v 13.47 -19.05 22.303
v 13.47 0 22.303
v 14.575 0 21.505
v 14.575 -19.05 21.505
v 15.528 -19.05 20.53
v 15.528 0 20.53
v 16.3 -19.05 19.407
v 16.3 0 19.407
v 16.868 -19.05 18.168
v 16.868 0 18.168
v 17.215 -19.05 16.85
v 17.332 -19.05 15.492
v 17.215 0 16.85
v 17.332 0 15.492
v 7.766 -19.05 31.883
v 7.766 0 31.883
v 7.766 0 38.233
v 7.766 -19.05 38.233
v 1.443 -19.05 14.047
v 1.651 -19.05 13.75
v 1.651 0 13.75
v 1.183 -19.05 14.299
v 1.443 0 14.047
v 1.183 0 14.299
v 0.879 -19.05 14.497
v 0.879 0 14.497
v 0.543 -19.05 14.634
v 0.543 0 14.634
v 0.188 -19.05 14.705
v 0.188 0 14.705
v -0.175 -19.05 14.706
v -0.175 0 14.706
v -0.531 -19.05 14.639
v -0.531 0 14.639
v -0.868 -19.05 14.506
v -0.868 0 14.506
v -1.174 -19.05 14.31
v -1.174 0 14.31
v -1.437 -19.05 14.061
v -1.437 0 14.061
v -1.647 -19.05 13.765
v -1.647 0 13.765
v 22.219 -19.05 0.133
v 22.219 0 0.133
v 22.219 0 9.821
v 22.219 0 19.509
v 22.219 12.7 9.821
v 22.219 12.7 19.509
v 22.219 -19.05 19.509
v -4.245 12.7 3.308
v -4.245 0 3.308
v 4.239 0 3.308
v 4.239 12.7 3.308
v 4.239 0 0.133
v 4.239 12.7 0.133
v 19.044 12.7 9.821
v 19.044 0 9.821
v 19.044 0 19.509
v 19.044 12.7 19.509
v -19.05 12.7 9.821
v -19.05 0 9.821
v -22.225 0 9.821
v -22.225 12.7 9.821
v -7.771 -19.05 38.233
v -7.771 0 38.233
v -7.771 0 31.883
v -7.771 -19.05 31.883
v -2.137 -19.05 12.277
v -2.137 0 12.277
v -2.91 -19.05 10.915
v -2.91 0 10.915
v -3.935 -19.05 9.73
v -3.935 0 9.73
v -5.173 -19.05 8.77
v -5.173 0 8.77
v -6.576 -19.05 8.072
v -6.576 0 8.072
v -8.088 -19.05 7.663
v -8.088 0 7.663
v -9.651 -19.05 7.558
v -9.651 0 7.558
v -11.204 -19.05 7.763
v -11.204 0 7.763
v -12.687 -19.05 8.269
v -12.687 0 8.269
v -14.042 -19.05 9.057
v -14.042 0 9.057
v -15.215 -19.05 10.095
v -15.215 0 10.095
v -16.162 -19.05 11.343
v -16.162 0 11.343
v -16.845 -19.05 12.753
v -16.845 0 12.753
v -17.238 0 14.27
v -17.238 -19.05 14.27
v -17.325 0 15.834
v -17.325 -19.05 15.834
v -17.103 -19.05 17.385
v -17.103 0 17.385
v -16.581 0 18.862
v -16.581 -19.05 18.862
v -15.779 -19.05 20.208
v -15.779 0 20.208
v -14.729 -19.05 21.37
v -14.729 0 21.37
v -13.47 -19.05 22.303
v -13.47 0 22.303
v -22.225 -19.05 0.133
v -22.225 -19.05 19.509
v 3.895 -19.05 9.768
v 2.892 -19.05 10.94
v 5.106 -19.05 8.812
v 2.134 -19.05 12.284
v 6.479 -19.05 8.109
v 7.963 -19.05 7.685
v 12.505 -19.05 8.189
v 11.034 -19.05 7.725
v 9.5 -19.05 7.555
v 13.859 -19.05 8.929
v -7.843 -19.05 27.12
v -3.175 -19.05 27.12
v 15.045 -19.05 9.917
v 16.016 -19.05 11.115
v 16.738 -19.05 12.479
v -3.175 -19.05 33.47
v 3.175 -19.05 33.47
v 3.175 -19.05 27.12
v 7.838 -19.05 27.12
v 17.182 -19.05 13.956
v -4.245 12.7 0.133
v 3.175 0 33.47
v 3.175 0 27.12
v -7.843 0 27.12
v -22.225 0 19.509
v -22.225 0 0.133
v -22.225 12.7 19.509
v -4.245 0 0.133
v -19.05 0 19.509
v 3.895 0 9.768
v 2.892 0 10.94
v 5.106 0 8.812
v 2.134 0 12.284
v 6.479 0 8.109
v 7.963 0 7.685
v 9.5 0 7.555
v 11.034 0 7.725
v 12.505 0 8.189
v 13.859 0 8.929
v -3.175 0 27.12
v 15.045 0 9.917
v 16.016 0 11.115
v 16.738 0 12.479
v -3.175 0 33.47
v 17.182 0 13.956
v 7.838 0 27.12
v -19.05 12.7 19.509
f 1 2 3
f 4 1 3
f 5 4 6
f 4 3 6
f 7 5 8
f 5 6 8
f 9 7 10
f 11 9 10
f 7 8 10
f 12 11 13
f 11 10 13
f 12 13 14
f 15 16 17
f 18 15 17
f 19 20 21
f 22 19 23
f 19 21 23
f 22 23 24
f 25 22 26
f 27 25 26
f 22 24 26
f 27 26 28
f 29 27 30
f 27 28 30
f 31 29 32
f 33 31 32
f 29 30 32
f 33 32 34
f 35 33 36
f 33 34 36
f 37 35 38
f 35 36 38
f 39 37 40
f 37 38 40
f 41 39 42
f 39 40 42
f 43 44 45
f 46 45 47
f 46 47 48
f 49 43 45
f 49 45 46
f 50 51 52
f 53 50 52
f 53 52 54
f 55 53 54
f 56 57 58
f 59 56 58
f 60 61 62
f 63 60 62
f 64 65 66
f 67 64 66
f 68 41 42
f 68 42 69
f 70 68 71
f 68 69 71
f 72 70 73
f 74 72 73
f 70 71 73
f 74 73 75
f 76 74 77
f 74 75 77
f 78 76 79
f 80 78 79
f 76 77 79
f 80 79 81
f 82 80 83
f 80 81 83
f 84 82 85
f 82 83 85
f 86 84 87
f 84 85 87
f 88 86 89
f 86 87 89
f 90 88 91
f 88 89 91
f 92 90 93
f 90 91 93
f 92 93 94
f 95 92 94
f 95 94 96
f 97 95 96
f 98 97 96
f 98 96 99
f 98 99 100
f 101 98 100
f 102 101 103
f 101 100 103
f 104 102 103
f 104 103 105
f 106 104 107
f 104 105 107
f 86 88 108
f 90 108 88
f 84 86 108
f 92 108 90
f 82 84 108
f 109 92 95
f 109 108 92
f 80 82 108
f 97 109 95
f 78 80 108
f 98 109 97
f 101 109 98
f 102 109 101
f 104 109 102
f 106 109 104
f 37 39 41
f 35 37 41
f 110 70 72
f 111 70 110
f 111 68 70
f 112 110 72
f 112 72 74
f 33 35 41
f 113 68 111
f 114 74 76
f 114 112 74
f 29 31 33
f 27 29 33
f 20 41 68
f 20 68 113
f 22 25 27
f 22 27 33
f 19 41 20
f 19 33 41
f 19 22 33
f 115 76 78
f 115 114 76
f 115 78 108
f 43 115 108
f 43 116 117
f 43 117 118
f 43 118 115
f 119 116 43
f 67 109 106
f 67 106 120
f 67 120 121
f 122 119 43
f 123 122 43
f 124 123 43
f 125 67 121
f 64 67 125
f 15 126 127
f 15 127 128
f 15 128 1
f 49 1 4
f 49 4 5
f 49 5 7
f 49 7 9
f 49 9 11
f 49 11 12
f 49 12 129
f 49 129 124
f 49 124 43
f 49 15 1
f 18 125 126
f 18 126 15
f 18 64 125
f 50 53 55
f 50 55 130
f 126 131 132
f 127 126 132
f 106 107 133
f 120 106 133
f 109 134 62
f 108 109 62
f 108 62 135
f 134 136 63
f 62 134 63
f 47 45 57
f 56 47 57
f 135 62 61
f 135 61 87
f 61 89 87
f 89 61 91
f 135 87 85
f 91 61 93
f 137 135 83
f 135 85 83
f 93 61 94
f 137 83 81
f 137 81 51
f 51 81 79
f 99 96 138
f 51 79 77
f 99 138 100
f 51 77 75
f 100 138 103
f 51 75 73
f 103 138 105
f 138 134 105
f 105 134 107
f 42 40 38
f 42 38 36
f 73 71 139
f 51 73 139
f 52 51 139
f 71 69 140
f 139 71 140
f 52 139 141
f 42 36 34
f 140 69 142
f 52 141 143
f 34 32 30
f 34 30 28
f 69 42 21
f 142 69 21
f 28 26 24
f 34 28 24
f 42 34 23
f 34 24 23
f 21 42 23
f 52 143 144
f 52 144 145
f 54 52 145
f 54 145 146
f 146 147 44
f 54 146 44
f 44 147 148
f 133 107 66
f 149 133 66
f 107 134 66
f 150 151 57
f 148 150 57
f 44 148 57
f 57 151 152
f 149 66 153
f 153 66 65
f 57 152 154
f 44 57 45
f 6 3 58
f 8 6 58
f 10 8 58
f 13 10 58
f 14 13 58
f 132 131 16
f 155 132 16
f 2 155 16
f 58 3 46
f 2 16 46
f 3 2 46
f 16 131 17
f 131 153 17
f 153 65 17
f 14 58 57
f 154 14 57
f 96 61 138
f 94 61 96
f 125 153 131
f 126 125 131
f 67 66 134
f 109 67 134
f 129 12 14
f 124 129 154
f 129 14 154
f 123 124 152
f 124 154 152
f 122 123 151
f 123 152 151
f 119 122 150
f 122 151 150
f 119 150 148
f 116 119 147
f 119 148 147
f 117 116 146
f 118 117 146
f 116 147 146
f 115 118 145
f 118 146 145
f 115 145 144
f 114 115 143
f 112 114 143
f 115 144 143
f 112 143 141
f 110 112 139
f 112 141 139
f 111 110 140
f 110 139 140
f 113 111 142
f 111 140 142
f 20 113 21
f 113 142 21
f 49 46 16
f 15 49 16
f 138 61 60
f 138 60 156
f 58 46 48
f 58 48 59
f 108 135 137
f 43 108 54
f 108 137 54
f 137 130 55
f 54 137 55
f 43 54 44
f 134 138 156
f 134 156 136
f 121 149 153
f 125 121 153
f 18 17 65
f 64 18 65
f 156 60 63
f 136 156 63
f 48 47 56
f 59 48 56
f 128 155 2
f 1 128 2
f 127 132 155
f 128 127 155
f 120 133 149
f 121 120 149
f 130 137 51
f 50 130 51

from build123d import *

# Parameters (mm, degrees)
F1_DEPTH = 19.05
F2_W     = 3.175
F2_H     = 9.6882774726
F3_DEPTH = 12.7


# Not quite as in the source:
# - ends of sketch curves that miss each other by under 0.0002 mm in the source are joined


with BuildPart() as f1:
    # F0 (on Front) → F1 (new body)
    with BuildSketch(Plane.XZ):
        Polygon((-7.493, 0.1328983575), (0, 0.1328983575), (7.493, 0.1328983575), (22.2194990303, 0.1328983575), (22.2194990303, 19.5094533027), (7.7658264293, 31.8828983575), (7.7658264293, 38.2328983575), (-7.7713273633, 38.2328983575), (-7.7713273633, 31.8828983575), (-22.2249999642, 19.5094533027), (-22.2249999642, 4.5234533027), (-22.2249999642, 0.1328983575), align=None)
        with BuildLine():
            ThreePointArc((-1.6471995105, 13.7654938087), (-14.0416307026, 9.056743723), (-13.4701421127, 22.3031640975))
            Line((-13.4701421127, 22.3031640975), (-7.8430329322, 27.1203983575))
            Line((-7.8430329322, 27.1203983575), (-3.175, 27.1203983575))
            Line((-3.175, 27.1203983575), (-3.175, 30.2953983575))
            Line((-3.175, 30.2953983575), (-3.175, 33.4703983575))
            Line((-3.175, 33.4703983575), (3.175, 33.4703983575))
            Line((3.175, 33.4703983575), (3.175, 30.2953983575))
            Line((3.175, 30.2953983575), (3.175, 27.1203983575))
            Line((3.175, 27.1203983575), (7.8375319983, 27.1203983575))
            Line((7.8375319983, 27.1203983575), (13.4701421127, 22.3031640975))
            ThreePointArc((13.4701421127, 22.3031640975), (16.2995077669, 19.40684068), (17.3322006389, 15.4917998403))
            ThreePointArc((17.3322006389, 15.4917998403), (10.2711150187, 7.6028326022), (1.6507381924, 13.7496885133))
            ThreePointArc((1.6507381924, 13.7496885133), (0.0063534061, 14.7141035739), (-1.6471995105, 13.7654938087))
        make_face(mode=Mode.SUBTRACT)
    extrude(amount=F1_DEPTH)

    # F2 (on face) → F3 (join)
    with BuildSketch(Plane(origin=(0, 0, 0), x_dir=(-1, 0, 0), z_dir=(0, 1, 0))):
        with Locations((-20.6319990303, 14.6653145664)):
            Rectangle(F2_W, F2_H)
        with Locations((20.6374999642, 14.6653145664)):
            Rectangle(F2_W, F2_H)
        Polygon((-4.239049533, 3.3078983575), (-4.239049533, 0.1328983575), (0.002750467, 0.1328983575), (4.244550467, 0.1328983575), (4.244550467, 3.3078983575), align=None)
    extrude(amount=F3_DEPTH)


solid = f1.part
